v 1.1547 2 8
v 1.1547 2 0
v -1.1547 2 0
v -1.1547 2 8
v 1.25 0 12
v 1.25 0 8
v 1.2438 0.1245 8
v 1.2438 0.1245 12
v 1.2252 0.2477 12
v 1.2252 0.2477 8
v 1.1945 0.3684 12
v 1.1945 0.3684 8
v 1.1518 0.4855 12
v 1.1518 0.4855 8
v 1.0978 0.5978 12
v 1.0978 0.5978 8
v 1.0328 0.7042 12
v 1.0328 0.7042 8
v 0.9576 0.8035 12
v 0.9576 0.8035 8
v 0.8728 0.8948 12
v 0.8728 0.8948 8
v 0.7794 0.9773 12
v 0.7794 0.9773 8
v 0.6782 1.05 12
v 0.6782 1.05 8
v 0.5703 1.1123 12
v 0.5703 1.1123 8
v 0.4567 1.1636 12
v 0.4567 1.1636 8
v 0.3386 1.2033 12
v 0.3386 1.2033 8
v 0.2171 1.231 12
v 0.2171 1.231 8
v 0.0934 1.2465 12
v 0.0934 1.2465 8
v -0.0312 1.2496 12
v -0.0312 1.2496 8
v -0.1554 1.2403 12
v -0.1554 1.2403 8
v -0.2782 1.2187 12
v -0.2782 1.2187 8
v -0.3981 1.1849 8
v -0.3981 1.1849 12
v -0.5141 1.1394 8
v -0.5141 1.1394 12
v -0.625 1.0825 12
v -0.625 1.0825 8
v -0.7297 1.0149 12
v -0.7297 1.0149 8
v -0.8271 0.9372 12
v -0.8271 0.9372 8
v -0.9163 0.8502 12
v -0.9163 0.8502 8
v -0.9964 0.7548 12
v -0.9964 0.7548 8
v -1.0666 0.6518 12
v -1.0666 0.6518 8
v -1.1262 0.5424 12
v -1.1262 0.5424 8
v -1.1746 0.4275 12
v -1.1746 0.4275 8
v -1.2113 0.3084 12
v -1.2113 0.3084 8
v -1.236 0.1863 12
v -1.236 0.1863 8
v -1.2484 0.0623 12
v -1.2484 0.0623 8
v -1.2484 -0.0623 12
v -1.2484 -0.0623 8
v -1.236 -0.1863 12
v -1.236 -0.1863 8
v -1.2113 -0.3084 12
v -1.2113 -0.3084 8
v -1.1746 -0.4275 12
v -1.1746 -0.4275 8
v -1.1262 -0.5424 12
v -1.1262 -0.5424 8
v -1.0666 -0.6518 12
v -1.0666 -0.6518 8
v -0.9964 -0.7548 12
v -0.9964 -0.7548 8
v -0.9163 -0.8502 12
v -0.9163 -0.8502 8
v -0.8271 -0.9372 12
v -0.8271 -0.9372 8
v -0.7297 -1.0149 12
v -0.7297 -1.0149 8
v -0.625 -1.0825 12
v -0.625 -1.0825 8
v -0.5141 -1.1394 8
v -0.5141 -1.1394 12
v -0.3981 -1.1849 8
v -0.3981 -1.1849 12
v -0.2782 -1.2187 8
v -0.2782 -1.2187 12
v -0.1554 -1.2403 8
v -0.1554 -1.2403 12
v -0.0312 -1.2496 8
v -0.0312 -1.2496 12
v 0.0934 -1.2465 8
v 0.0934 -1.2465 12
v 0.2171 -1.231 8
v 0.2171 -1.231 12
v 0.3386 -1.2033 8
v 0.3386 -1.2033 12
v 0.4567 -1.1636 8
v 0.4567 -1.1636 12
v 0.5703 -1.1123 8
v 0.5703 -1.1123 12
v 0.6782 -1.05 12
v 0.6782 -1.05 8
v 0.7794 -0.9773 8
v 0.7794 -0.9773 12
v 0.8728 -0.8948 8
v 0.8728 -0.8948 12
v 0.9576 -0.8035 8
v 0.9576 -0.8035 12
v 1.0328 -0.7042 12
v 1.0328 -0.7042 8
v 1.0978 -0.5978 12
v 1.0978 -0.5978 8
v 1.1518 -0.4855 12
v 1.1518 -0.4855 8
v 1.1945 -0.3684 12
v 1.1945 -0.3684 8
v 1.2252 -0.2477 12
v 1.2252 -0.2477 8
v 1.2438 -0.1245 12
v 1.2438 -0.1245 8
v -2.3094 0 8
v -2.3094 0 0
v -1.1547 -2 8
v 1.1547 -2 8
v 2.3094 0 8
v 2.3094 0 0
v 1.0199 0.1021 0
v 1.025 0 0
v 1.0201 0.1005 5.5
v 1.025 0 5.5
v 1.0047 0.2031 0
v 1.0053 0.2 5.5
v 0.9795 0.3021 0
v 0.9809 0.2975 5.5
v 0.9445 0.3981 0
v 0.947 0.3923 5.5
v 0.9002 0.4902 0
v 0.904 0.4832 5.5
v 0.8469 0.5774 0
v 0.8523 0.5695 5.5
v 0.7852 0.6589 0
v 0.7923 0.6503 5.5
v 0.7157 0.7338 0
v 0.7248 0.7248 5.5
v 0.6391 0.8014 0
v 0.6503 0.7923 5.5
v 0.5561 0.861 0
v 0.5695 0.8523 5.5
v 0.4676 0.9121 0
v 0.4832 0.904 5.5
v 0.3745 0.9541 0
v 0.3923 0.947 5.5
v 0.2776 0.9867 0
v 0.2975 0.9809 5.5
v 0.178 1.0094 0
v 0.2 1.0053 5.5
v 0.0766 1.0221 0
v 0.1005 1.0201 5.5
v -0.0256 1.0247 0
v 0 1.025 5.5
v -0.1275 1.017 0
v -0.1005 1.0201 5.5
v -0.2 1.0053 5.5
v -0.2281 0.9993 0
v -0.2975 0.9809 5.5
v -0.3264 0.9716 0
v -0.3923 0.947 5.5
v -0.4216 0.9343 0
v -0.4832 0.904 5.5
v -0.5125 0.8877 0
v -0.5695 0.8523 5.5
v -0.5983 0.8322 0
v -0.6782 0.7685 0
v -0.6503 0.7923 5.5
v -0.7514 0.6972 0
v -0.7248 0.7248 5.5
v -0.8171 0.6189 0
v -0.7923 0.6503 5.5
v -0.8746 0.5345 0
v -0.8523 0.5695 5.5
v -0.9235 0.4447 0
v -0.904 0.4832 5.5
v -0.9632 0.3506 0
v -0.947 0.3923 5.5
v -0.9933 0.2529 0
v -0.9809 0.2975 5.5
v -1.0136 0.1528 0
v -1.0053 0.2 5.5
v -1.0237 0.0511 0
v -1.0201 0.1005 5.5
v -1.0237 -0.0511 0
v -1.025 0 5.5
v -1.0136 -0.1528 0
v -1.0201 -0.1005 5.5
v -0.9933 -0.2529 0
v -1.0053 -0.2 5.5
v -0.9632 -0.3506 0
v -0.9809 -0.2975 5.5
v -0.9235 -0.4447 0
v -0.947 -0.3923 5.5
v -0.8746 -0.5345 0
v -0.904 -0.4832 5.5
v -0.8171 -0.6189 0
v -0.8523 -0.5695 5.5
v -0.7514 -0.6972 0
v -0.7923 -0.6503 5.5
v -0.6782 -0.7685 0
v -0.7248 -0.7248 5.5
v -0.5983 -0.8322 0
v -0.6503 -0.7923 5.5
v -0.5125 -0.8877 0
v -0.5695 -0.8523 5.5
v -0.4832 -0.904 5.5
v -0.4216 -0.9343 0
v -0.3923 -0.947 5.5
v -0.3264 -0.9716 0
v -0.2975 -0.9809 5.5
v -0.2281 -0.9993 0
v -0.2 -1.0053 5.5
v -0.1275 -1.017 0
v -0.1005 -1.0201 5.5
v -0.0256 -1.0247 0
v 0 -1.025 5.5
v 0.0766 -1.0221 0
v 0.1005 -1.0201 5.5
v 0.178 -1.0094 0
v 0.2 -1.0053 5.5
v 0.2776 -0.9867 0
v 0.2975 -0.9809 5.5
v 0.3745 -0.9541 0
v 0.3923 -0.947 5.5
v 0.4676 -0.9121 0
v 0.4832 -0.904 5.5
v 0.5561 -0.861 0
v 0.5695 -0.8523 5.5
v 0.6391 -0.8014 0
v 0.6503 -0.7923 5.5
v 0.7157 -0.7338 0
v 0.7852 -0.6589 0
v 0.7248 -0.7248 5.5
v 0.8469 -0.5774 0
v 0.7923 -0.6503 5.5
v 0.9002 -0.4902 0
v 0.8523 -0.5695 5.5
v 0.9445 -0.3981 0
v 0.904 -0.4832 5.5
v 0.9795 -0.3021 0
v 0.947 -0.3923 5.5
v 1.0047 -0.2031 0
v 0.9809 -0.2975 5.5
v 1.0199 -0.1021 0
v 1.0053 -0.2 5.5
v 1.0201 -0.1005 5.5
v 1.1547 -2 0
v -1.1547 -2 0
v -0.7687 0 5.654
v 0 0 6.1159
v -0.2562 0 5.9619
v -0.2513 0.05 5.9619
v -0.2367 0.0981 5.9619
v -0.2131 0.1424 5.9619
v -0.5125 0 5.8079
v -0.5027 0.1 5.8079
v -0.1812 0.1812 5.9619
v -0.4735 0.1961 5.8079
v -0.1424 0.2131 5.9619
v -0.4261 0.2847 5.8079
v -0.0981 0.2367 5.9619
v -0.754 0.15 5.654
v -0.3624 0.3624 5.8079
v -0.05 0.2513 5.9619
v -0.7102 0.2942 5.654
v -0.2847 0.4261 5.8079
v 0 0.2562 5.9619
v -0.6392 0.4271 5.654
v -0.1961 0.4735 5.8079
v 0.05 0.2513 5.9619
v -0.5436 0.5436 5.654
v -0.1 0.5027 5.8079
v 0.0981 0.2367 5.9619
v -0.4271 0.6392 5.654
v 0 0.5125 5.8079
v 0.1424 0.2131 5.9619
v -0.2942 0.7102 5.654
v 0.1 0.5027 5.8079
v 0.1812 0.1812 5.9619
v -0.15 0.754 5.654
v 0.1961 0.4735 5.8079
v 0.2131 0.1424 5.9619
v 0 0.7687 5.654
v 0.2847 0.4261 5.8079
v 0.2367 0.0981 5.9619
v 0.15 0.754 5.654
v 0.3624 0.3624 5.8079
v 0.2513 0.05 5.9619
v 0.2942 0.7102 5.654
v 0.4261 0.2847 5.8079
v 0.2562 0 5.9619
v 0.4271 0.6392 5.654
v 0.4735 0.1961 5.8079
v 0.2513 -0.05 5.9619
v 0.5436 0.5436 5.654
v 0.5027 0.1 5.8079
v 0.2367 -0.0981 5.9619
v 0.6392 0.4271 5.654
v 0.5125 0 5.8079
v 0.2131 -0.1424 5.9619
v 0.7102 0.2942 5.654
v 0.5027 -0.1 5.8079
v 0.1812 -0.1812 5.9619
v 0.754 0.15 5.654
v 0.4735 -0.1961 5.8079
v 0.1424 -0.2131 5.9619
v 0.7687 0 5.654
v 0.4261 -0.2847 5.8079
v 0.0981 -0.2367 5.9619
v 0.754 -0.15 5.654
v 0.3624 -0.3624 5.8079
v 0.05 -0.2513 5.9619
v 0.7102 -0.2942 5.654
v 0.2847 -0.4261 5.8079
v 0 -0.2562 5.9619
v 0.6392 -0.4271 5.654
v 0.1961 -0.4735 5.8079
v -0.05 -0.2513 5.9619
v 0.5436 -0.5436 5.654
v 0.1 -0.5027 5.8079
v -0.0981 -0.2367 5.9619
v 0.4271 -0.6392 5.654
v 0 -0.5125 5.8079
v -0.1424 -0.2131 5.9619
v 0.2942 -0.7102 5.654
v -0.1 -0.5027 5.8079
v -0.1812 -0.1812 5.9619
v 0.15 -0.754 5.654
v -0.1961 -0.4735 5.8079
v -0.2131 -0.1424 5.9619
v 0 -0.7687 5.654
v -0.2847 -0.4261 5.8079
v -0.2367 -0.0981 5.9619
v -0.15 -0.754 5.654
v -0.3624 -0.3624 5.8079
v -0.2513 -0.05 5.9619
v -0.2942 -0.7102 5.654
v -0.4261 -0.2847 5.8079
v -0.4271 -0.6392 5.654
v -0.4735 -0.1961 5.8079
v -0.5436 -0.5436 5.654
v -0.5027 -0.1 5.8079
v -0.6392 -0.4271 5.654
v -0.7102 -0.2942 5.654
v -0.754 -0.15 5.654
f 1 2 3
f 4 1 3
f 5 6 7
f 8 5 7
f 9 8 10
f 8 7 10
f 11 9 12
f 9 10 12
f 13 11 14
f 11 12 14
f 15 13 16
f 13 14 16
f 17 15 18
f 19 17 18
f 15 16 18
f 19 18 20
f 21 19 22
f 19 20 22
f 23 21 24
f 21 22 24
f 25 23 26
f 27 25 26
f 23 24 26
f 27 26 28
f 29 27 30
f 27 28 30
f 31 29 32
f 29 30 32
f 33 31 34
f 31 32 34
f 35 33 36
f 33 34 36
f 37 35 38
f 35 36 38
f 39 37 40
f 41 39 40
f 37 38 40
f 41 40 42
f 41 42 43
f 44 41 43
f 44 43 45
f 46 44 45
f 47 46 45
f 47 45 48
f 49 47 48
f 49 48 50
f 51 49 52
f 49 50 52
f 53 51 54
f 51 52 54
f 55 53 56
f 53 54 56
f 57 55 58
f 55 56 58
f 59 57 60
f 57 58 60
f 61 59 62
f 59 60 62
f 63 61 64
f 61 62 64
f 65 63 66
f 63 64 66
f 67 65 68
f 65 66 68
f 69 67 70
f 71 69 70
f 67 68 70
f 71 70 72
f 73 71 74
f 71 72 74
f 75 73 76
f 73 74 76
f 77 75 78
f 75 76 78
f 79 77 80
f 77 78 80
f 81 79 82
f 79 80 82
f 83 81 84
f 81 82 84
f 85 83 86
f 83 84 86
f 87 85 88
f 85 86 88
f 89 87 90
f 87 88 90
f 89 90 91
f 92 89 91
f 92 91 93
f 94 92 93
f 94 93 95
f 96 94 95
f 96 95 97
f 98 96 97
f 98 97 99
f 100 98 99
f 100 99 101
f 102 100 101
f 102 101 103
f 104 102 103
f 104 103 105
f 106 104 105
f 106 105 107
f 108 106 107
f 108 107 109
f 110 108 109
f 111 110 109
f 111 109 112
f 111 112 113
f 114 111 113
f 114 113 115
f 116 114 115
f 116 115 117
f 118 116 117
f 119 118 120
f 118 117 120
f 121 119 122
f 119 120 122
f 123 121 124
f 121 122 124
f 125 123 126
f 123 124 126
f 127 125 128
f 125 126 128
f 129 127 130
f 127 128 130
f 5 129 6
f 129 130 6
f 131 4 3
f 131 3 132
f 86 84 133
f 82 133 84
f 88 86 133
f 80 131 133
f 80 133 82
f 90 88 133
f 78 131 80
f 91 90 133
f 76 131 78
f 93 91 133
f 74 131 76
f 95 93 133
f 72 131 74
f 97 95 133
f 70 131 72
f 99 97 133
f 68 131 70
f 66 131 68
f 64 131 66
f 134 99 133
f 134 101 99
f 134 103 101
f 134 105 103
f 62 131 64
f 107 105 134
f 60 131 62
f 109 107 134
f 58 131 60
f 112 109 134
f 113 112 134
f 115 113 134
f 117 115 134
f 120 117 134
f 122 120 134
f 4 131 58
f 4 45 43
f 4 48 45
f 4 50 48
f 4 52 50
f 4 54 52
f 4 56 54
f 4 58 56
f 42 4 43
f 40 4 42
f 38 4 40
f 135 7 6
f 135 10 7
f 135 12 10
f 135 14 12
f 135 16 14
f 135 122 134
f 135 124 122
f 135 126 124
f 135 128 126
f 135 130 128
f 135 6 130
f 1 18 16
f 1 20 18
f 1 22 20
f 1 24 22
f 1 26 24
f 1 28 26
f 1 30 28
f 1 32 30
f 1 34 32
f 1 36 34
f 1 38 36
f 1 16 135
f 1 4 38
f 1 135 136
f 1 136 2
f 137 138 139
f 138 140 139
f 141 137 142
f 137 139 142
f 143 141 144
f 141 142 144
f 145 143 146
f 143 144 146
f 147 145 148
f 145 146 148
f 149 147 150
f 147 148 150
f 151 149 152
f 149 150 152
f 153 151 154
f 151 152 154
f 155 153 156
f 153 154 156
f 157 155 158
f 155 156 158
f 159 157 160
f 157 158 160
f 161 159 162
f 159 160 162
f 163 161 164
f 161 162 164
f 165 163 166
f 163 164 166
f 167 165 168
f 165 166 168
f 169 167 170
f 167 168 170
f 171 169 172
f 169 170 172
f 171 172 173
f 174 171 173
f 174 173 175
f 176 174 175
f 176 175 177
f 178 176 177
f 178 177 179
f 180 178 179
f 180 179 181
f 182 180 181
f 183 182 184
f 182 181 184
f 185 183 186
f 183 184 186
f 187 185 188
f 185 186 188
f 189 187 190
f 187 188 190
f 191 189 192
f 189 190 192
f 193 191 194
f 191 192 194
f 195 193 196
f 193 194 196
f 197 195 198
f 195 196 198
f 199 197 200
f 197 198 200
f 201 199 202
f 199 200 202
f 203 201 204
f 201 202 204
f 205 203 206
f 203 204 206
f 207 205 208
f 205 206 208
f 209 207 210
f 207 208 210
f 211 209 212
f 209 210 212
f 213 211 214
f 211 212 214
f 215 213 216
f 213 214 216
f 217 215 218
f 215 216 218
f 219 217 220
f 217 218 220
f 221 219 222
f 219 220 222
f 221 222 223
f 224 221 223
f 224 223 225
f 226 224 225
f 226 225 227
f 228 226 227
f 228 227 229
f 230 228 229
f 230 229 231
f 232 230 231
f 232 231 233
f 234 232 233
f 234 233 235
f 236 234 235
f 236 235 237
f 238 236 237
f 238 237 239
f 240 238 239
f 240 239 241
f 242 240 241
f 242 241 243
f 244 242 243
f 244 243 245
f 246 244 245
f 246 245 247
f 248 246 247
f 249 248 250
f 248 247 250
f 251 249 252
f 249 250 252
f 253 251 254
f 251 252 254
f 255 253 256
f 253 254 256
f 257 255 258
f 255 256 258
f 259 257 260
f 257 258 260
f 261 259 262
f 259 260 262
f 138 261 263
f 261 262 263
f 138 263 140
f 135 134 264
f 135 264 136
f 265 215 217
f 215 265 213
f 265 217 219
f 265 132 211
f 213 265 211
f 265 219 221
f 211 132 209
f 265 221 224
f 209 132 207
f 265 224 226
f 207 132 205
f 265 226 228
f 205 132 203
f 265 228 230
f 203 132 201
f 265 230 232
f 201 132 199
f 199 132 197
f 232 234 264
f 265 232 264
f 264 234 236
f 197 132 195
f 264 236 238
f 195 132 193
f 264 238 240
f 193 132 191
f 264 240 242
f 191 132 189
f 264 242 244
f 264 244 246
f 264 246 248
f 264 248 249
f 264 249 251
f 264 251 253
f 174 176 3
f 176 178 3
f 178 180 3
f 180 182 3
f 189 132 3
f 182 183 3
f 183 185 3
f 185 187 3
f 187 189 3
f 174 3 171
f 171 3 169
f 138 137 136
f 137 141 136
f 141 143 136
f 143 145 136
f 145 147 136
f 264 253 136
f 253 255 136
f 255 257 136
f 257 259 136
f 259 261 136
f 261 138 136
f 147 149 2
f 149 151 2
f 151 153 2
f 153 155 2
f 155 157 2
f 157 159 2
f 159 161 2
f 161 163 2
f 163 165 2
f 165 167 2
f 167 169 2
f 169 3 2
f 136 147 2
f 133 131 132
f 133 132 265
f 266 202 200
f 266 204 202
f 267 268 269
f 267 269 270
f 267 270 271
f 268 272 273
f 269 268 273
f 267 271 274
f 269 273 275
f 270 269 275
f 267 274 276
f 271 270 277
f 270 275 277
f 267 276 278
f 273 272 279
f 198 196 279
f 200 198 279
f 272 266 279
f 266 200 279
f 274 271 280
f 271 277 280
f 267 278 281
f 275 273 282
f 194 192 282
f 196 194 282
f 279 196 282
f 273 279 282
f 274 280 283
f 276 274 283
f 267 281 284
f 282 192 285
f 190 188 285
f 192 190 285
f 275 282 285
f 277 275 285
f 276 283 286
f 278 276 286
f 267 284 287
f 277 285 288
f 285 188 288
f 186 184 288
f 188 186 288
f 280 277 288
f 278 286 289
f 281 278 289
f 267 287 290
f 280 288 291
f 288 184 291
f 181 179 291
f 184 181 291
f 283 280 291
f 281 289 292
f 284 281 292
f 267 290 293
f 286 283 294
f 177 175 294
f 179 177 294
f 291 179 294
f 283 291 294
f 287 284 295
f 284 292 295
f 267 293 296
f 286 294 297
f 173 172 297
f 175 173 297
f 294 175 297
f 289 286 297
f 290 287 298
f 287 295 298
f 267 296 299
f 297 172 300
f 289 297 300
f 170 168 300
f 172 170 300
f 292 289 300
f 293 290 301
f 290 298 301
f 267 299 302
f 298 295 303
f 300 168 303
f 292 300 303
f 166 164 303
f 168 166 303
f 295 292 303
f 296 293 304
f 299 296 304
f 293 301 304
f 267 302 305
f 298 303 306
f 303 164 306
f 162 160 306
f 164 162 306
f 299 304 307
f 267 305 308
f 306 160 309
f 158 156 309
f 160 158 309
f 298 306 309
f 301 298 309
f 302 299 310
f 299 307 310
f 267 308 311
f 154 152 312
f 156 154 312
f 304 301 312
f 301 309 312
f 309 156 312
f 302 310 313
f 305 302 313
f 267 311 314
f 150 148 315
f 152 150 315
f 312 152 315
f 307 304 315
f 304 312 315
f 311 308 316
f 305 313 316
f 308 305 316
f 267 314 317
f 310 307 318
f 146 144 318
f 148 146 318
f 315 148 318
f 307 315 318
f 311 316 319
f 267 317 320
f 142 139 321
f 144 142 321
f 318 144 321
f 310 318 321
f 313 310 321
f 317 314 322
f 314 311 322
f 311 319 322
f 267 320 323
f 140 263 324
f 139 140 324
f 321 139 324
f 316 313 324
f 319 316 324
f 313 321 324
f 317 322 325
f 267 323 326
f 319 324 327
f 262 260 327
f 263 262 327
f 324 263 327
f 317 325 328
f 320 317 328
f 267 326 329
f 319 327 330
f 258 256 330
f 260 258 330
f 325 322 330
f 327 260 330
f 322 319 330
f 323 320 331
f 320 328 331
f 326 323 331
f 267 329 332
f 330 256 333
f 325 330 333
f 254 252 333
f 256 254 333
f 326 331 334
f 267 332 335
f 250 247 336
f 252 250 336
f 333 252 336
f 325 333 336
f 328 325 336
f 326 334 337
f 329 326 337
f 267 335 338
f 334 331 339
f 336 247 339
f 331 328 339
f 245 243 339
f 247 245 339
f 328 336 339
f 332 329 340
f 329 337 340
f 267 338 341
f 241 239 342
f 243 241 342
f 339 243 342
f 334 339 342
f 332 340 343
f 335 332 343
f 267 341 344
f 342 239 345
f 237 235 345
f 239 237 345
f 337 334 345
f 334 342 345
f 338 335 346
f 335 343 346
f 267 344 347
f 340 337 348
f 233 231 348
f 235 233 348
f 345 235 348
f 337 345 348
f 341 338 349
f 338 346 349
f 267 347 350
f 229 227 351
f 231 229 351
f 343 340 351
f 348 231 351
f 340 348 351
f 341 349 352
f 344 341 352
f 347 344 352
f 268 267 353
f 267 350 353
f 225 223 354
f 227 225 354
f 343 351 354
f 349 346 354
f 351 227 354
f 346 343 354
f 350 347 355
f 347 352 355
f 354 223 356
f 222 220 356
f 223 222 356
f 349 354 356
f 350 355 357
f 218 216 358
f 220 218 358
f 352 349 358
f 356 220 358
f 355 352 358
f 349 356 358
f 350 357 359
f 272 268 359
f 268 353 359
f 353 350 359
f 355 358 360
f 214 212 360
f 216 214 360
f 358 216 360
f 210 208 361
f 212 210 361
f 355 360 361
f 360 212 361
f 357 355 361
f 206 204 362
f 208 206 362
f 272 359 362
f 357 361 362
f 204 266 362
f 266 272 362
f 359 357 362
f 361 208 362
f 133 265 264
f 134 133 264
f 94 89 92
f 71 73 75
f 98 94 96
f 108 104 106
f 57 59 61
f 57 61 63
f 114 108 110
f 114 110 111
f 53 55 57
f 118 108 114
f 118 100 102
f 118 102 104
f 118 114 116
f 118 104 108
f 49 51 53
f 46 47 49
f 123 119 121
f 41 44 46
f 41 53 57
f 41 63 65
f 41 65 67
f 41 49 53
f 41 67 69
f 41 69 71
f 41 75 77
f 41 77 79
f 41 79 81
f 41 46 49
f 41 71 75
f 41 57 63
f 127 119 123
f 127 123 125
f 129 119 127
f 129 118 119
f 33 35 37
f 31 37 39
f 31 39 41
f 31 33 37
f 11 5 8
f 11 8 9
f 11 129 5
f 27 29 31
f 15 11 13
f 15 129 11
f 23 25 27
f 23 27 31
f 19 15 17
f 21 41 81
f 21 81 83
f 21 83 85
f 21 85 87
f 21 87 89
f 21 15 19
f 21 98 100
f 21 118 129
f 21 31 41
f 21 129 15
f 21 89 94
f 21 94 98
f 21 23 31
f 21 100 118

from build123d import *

# Parameters (mm, degrees)
BOSS_EXTRUDE1_DEPTH     = 8
SKETCH2_R               = 1.25
BOSS_EXTRUDE2_DEPTH     = 4
M2_5_TAPPED_HOLE1_D     = 2.05
M2_5_TAPPED_HOLE1_DEPTH = 5.5
M2_5_TAPPED_HOLE1_TIP   = 0.615882135


with BuildPart() as part:
    # Sketch1 → Boss-Extrude1 (new body)
    with BuildSketch(Plane.XY):
        Polygon((-1.154700538, -2), (1.154700538, -2), (2.309401077, 0), (1.154700538, 2), (-1.154700538, 2), (-2.309401077, 0), align=None)
    extrude(amount=BOSS_EXTRUDE1_DEPTH)

    # Sketch2 → Boss-Extrude2 (add)
    with BuildSketch(Plane.XY.offset(8)):
        Circle(SKETCH2_R)
    extrude(amount=BOSS_EXTRUDE2_DEPTH)

    # M2.5 Tapped Hole1
    with Locations(Plane(origin=(0, 0, 0), x_dir=(-1, 0, 0), z_dir=(0, 0, -1))):
        with Locations((0, 0)):
            Hole(M2_5_TAPPED_HOLE1_D / 2, depth=M2_5_TAPPED_HOLE1_DEPTH)
            with Locations((0, 0, -(M2_5_TAPPED_HOLE1_DEPTH + M2_5_TAPPED_HOLE1_TIP / 2))):  # 118° drill point
                Cone(0, M2_5_TAPPED_HOLE1_D / 2, M2_5_TAPPED_HOLE1_TIP, mode=Mode.SUBTRACT)


solid = part.part
